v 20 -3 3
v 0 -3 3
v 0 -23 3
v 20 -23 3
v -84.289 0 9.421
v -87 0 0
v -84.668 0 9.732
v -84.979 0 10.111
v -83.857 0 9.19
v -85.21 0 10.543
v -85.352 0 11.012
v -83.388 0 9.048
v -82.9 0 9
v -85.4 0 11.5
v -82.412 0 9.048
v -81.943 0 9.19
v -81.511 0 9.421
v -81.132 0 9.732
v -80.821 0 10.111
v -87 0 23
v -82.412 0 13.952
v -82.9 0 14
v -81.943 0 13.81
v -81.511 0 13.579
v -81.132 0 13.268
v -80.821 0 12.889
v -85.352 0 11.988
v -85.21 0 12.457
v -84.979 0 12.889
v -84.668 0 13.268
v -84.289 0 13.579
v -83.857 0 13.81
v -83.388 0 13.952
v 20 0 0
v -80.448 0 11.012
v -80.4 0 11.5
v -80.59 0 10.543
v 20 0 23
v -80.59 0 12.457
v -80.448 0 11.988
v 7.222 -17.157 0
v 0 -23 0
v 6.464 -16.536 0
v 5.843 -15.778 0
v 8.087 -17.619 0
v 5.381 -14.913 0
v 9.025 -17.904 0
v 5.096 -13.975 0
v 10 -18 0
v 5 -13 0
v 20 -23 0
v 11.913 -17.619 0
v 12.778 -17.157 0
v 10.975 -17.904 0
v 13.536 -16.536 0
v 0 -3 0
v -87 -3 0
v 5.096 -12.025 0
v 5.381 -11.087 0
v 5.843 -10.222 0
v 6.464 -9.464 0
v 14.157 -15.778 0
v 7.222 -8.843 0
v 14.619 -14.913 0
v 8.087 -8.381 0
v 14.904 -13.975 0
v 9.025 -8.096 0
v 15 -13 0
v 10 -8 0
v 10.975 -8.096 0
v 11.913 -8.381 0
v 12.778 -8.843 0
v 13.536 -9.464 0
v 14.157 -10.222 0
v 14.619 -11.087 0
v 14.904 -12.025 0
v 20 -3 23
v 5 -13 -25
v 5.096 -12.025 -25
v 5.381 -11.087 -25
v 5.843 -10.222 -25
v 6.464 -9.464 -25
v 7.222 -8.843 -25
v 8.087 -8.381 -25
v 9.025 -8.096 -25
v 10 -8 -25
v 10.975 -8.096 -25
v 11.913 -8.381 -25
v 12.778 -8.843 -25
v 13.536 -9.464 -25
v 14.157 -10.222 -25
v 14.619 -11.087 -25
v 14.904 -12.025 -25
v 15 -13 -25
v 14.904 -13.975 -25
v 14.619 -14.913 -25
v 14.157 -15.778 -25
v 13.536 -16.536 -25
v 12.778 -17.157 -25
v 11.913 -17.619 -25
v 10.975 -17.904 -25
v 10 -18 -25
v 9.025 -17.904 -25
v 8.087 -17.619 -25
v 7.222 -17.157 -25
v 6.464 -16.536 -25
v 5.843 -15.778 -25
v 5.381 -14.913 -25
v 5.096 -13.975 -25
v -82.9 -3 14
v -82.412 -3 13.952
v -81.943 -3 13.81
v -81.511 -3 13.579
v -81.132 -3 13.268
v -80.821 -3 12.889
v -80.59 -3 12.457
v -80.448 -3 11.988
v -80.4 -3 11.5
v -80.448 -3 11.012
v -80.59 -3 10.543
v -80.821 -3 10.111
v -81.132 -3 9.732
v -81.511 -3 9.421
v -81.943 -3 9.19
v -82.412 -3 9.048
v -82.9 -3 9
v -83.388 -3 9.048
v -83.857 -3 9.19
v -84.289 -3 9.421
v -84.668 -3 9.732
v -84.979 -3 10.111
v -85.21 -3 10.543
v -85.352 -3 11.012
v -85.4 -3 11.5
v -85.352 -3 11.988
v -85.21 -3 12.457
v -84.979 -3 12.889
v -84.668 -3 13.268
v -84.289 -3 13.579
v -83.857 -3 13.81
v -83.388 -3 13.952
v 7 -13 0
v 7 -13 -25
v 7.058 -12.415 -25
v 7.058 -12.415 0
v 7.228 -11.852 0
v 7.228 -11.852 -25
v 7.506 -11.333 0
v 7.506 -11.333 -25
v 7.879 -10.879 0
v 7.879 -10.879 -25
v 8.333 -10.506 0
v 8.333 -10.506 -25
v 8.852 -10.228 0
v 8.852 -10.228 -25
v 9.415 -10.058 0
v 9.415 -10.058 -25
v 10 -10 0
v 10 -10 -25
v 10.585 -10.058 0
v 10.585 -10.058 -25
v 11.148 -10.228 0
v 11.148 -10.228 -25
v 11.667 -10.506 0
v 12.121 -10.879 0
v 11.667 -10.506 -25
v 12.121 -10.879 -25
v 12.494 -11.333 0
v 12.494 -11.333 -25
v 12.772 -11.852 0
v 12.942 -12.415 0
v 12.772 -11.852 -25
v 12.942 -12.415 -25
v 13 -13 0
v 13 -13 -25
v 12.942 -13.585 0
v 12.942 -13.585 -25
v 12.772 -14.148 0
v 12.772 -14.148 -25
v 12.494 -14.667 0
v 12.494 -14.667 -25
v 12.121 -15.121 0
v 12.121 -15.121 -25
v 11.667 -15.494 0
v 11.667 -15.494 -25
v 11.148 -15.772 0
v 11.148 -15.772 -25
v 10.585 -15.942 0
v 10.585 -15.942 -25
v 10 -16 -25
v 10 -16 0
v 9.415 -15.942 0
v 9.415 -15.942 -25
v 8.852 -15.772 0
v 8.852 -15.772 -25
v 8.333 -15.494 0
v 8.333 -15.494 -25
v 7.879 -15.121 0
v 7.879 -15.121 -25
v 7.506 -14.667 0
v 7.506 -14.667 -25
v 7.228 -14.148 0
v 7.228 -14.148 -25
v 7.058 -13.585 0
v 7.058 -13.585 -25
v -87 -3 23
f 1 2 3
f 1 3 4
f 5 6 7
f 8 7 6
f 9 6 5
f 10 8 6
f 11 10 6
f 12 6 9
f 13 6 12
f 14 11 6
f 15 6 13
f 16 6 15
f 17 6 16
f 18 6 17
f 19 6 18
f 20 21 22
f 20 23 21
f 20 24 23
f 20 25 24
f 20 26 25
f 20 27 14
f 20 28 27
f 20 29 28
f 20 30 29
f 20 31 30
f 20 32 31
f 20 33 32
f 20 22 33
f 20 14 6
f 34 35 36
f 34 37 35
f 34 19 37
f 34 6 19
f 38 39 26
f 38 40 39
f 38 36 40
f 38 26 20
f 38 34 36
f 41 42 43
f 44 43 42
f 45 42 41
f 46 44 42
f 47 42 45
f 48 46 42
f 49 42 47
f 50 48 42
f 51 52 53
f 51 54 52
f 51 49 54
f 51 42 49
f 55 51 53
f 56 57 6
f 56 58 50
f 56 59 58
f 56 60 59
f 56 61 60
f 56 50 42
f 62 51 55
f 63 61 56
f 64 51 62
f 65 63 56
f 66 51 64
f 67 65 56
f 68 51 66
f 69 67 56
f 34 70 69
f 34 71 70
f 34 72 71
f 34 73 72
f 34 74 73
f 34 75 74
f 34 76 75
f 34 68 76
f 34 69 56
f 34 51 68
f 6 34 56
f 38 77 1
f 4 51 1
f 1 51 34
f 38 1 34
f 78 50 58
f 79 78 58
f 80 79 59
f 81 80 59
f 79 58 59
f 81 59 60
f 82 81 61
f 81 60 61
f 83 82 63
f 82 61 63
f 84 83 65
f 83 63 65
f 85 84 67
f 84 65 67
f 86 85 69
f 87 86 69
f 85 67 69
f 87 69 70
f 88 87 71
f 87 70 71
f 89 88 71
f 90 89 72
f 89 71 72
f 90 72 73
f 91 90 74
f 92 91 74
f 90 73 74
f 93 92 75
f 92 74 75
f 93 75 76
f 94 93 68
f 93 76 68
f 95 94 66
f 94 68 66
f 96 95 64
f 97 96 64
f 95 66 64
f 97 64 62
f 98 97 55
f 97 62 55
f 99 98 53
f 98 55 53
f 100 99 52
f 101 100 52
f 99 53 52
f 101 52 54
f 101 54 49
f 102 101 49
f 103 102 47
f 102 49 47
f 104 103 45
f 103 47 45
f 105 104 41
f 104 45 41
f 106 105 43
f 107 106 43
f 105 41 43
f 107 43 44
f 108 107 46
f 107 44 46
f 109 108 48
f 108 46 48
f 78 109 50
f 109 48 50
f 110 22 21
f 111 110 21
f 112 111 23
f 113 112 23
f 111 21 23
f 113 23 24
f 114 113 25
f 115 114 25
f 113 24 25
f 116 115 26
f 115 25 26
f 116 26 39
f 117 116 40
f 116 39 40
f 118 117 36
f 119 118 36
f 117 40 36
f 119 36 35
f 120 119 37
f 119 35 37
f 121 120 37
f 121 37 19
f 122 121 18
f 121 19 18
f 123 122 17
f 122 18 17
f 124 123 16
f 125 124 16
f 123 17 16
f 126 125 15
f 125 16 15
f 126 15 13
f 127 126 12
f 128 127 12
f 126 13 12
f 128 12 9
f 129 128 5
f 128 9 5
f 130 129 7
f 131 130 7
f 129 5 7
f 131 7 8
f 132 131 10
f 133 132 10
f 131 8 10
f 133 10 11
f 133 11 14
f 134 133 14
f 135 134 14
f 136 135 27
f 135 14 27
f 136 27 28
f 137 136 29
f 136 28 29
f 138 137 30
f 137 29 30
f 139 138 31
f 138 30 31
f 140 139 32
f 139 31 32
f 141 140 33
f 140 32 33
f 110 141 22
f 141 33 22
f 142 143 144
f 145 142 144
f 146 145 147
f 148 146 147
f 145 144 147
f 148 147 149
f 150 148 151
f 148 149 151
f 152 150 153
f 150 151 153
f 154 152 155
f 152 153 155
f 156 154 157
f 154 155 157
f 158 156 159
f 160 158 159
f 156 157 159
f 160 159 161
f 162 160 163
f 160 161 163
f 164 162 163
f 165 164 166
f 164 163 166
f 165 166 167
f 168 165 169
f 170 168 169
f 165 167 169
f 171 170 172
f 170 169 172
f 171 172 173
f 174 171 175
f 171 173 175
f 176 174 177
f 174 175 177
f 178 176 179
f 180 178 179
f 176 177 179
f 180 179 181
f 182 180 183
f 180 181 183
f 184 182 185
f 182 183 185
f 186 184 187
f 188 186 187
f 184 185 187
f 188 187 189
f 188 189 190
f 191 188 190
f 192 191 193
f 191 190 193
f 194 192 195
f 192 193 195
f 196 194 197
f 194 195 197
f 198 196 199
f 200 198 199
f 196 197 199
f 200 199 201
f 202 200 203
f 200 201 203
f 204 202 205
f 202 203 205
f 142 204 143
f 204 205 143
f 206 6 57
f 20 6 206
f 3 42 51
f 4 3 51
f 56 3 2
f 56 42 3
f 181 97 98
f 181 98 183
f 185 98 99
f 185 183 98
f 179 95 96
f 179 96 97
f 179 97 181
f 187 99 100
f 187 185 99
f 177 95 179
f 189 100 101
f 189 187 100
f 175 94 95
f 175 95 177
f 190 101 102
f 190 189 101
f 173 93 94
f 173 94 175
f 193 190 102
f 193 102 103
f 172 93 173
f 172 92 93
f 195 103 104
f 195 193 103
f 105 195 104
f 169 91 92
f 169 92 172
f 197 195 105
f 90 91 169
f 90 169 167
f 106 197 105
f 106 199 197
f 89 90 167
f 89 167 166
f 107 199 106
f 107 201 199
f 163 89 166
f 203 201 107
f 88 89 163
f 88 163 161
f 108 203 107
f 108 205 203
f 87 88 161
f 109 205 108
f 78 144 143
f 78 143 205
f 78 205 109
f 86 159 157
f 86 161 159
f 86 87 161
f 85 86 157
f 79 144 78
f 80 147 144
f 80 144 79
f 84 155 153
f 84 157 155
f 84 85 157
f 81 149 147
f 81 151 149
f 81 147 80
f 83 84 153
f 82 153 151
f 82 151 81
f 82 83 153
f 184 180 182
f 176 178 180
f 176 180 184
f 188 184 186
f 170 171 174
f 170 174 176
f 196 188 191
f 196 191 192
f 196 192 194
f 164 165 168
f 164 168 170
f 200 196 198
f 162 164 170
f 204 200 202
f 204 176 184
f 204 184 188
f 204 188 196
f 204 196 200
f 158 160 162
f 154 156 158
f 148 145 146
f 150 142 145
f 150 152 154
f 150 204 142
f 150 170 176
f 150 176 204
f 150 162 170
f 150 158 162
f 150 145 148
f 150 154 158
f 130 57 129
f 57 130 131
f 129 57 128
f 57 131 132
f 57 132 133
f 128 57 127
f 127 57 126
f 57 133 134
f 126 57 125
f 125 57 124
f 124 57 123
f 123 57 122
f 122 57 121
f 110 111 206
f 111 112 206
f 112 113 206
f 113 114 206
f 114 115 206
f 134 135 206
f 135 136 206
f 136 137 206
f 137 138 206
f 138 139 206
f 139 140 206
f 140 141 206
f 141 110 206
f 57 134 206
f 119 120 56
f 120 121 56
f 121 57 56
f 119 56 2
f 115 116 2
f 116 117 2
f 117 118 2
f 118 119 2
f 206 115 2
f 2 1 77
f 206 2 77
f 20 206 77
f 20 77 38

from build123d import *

# Parameters (mm, degrees)
SKETCH1_W           = 20
SKETCH1_H           = 23
BOSS_EXTRUDE1_DEPTH = 3
SKETCH2_W           = 20
SKETCH2_H           = 3
BOSS_EXTRUDE2_DEPTH = 20
SKETCH3_R           = 5
BOSS_EXTRUDE3_DEPTH = 25
SKETCH4_R           = 3
CUT_EXTRUDE1_DEPTH  = 25
SKETCH5_W           = 23
SKETCH5_H           = 3
BOSS_EXTRUDE4_DEPTH = 87
SKETCH6_R           = 2.5
CUT_EXTRUDE2_DEPTH  = 3


with BuildPart() as part:
    # Sketch1 → Boss-Extrude1 (new body)
    with BuildSketch(Plane.XY):
        with Locations((10, -11.5)):
            Rectangle(SKETCH1_W, SKETCH1_H)
    extrude(amount=BOSS_EXTRUDE1_DEPTH)

    # Sketch2 → Boss-Extrude2 (add)
    with BuildSketch(Plane.XY.offset(3)):
        with Locations((10, -1.5)):
            Rectangle(SKETCH2_W, SKETCH2_H)
    extrude(amount=BOSS_EXTRUDE2_DEPTH)

    # Sketch3 → Boss-Extrude3 (add)
    with BuildSketch(Plane(origin=(0, 0, 0), x_dir=(-1, 0, 0), z_dir=(0, 0, -1))):
        with Locations((-10, -13)):
            Circle(SKETCH3_R)
    extrude(amount=BOSS_EXTRUDE3_DEPTH)

    # Sketch4 → Cut-Extrude1 (cut)
    with BuildSketch(Plane(origin=(0, 0, -25), x_dir=(-1, 0, 0), z_dir=(0, 0, -1))):
        with Locations((-10, -13)):
            Circle(SKETCH4_R)
    extrude(amount=-CUT_EXTRUDE1_DEPTH, mode=Mode.SUBTRACT)

    # Sketch5 → Boss-Extrude4 (add)
    with BuildSketch(Plane.ZY):
        with Locations((11.5, -1.5)):
            Rectangle(SKETCH5_W, SKETCH5_H)
    extrude(amount=BOSS_EXTRUDE4_DEPTH)

    # Sketch6 → Cut-Extrude2 (cut)
    with BuildSketch(Plane(origin=(0, 0, 0), x_dir=(1, 0, 0), z_dir=(0, 1, 0))):
        with Locations(Location((-82.9, -11.5, 0), (0, 0, 270))):
            Circle(SKETCH6_R)
    extrude(amount=-CUT_EXTRUDE2_DEPTH, mode=Mode.SUBTRACT)


solid = part.part
